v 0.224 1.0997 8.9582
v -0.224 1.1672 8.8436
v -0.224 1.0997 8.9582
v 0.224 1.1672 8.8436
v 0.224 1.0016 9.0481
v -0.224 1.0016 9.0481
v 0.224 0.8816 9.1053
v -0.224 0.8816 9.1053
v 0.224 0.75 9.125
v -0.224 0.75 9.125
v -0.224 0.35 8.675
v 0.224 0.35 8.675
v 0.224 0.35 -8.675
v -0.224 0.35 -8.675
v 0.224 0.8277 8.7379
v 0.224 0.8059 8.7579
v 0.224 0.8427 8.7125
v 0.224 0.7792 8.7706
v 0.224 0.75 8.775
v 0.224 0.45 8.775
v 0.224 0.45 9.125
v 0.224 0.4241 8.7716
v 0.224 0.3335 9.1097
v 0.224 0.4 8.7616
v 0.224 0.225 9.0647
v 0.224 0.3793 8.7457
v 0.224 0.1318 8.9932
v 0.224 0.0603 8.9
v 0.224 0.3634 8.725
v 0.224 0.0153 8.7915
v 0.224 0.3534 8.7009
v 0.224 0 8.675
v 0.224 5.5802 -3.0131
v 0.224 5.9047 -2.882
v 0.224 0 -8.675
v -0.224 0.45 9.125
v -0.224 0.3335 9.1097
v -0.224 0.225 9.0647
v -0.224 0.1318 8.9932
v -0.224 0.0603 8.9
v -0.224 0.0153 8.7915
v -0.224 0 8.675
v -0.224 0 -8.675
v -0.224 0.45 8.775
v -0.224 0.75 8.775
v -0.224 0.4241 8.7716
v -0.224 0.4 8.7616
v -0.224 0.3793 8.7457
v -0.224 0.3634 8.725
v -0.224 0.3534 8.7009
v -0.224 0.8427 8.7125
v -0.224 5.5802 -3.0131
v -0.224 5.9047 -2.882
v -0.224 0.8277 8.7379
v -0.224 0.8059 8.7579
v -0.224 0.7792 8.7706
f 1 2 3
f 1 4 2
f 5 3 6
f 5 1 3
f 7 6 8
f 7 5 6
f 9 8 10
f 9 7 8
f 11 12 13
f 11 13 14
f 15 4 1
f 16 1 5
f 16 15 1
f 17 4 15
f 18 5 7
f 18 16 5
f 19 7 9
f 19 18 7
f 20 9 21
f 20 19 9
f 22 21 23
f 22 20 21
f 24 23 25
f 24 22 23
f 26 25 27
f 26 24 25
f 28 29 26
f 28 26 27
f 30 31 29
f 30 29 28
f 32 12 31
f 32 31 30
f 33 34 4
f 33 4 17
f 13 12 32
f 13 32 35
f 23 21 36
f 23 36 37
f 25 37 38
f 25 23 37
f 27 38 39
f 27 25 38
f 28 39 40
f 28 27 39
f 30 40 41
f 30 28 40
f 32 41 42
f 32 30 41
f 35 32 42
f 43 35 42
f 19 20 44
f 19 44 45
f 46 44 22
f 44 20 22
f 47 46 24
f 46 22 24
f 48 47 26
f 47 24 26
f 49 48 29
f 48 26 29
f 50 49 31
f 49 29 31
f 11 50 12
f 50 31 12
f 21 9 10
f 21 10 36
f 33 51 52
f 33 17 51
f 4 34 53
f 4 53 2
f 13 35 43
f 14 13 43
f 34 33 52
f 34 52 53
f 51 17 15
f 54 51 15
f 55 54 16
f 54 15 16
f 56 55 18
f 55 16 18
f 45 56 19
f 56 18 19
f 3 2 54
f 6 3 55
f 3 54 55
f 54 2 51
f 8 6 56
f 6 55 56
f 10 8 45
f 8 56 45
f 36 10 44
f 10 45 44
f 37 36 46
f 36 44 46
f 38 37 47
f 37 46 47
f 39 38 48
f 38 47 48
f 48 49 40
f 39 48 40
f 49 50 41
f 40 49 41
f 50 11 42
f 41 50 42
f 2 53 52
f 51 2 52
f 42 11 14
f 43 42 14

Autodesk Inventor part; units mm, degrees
ref_plane "YZ Plane" through (0, 0, 0) normal (1, 0, 0) x (0, 1, 0)
ref_plane "XZ Plane" through (0, 0, 0) normal (0, 1, 0) x (-1, 0, 0)
ref_plane "XY Plane" through (0, 0, 0) normal (0, 0, 1) x (1, 0, 0)
sketch "Sketch1" plane through (0, 0, 0) normal (0, 1, 0) x (-1, 0, 0)
  line L0 (0.224, 8.675) -> (-0.224, 8.675)
  line L1 (-0.224, 8.675) -> (-0.224, -8.675)
  line L2 (-0.224, -8.675) -> (0.224, -8.675)
  line L3 (0.224, -8.675) -> (0.224, 8.675)
  line L4 (0.224, 8.675) -> (-0.224, -8.675) construction
  line L5 (-0.224, 8.675) -> (0.224, -8.675) construction
  point P0 (0, 0)
  dimension "d0" = 0.448
  dimension "d1" = 17.35
extrude "Plate1" add sketch "Sketch1" along normal blind 0.35
sketch "Sketch2" plane through (0.224, 0.45, 8.775) normal (0, 0, 1) x (1, 0, 0)
  line L0 (-0.448, 0) -> (0, 0)
  line L1 (0, 0) -> (0, 0.3)
  line L2 (0, 0.3) -> (-0.448, 0.3)
  line L3 (-0.448, 0.3) -> (-0.448, 0)
edge flange "Flange1" height 0.75 angle 90 thickness 0.35 bend radius 0.1 thickness toward (0, 0, 1) relief tear relief width 0.35 relief depth 0.175 edges at (0, 0.35, 8.675) wall of the first edge with corners at (-0.224, 0.45, 8.775) (0.224, 0.45, 8.775) (0.224, 0.75, 8.775) (-0.224, 0.75, 8.775)
bend "Bend1"
corner "Corner1"
sketch "Sketch3" plane through (0.224, 0.8427, 8.7125) normal (0, 0.9271839, 0.3746066) x (-1, 0, 0)
  line L0 (0.448, 0) -> (0, 0)
  line L1 (0, 0) -> (0, -12.6465)
  line L2 (0, -12.6465) -> (0.448, -12.6465)
  line L3 (0.448, -12.6465) -> (0.448, 0)
edge flange "Flange2" height 12.95 angle 68 thickness 0.35 bend radius 0.1 thickness toward (0, 0.9271839, 0.3746066) relief tear relief width 0.35 relief depth 0.175 edges at (0, 0.75, 8.775) wall of the first edge with corners at (-0.224, 0.8427, 8.7125) (0.224, 0.8427, 8.7125) (0.224, 5.5802, -3.0131) (-0.224, 5.5802, -3.0131)
bend "Bend2"
corner "Corner2"
equation "\"d2\" = Thickness"
equation "\"d3\" = BendReliefWidth"
equation "\"d4\" = BendReliefDepth"
equation "\"d5\" = MinimumRemnant"
equation "\"d6\" = TransitionRadius"
equation "\"d9\" = BendRadius"
equation "\"d10\" = CornerReliefSize"
equation "\"d11\" = GapSize"
equation "\"d12\" = JacobiRadiusSize"
equation "\"d13\" = BendReliefWidth"
equation "\"d14\" = BendReliefDepth"
equation "\"d15\" = MinimumRemnant"
equation "\"d16\" = TransitionRadius"
equation "\"d19\" = BendRadius"
equation "\"d20\" = CornerReliefSize"
equation "\"d21\" = GapSize"
equation "\"d22\" = JacobiRadiusSize"
equation "\"BendReliefWidth\" = Thickness"
equation "\"BendReliefDepth\" = 0.5 * Thickness"
equation "\"CornerReliefSize\" = 4 * Thickness"
equation "\"MinimumRemnant\" = 2 * Thickness"
equation "\"TransitionRadius\" = BendRadius"
equation "\"JacobiRadiusSize\" = BendRadius"
equation "\"GapSize\" = Thickness"
equation "\"Thickness\" = 0.35"
equation "\"BendRadius\" = 0.1"
properties part number "RJ45 Odd Pins" material "Nickel-Copper Alloy 400"
